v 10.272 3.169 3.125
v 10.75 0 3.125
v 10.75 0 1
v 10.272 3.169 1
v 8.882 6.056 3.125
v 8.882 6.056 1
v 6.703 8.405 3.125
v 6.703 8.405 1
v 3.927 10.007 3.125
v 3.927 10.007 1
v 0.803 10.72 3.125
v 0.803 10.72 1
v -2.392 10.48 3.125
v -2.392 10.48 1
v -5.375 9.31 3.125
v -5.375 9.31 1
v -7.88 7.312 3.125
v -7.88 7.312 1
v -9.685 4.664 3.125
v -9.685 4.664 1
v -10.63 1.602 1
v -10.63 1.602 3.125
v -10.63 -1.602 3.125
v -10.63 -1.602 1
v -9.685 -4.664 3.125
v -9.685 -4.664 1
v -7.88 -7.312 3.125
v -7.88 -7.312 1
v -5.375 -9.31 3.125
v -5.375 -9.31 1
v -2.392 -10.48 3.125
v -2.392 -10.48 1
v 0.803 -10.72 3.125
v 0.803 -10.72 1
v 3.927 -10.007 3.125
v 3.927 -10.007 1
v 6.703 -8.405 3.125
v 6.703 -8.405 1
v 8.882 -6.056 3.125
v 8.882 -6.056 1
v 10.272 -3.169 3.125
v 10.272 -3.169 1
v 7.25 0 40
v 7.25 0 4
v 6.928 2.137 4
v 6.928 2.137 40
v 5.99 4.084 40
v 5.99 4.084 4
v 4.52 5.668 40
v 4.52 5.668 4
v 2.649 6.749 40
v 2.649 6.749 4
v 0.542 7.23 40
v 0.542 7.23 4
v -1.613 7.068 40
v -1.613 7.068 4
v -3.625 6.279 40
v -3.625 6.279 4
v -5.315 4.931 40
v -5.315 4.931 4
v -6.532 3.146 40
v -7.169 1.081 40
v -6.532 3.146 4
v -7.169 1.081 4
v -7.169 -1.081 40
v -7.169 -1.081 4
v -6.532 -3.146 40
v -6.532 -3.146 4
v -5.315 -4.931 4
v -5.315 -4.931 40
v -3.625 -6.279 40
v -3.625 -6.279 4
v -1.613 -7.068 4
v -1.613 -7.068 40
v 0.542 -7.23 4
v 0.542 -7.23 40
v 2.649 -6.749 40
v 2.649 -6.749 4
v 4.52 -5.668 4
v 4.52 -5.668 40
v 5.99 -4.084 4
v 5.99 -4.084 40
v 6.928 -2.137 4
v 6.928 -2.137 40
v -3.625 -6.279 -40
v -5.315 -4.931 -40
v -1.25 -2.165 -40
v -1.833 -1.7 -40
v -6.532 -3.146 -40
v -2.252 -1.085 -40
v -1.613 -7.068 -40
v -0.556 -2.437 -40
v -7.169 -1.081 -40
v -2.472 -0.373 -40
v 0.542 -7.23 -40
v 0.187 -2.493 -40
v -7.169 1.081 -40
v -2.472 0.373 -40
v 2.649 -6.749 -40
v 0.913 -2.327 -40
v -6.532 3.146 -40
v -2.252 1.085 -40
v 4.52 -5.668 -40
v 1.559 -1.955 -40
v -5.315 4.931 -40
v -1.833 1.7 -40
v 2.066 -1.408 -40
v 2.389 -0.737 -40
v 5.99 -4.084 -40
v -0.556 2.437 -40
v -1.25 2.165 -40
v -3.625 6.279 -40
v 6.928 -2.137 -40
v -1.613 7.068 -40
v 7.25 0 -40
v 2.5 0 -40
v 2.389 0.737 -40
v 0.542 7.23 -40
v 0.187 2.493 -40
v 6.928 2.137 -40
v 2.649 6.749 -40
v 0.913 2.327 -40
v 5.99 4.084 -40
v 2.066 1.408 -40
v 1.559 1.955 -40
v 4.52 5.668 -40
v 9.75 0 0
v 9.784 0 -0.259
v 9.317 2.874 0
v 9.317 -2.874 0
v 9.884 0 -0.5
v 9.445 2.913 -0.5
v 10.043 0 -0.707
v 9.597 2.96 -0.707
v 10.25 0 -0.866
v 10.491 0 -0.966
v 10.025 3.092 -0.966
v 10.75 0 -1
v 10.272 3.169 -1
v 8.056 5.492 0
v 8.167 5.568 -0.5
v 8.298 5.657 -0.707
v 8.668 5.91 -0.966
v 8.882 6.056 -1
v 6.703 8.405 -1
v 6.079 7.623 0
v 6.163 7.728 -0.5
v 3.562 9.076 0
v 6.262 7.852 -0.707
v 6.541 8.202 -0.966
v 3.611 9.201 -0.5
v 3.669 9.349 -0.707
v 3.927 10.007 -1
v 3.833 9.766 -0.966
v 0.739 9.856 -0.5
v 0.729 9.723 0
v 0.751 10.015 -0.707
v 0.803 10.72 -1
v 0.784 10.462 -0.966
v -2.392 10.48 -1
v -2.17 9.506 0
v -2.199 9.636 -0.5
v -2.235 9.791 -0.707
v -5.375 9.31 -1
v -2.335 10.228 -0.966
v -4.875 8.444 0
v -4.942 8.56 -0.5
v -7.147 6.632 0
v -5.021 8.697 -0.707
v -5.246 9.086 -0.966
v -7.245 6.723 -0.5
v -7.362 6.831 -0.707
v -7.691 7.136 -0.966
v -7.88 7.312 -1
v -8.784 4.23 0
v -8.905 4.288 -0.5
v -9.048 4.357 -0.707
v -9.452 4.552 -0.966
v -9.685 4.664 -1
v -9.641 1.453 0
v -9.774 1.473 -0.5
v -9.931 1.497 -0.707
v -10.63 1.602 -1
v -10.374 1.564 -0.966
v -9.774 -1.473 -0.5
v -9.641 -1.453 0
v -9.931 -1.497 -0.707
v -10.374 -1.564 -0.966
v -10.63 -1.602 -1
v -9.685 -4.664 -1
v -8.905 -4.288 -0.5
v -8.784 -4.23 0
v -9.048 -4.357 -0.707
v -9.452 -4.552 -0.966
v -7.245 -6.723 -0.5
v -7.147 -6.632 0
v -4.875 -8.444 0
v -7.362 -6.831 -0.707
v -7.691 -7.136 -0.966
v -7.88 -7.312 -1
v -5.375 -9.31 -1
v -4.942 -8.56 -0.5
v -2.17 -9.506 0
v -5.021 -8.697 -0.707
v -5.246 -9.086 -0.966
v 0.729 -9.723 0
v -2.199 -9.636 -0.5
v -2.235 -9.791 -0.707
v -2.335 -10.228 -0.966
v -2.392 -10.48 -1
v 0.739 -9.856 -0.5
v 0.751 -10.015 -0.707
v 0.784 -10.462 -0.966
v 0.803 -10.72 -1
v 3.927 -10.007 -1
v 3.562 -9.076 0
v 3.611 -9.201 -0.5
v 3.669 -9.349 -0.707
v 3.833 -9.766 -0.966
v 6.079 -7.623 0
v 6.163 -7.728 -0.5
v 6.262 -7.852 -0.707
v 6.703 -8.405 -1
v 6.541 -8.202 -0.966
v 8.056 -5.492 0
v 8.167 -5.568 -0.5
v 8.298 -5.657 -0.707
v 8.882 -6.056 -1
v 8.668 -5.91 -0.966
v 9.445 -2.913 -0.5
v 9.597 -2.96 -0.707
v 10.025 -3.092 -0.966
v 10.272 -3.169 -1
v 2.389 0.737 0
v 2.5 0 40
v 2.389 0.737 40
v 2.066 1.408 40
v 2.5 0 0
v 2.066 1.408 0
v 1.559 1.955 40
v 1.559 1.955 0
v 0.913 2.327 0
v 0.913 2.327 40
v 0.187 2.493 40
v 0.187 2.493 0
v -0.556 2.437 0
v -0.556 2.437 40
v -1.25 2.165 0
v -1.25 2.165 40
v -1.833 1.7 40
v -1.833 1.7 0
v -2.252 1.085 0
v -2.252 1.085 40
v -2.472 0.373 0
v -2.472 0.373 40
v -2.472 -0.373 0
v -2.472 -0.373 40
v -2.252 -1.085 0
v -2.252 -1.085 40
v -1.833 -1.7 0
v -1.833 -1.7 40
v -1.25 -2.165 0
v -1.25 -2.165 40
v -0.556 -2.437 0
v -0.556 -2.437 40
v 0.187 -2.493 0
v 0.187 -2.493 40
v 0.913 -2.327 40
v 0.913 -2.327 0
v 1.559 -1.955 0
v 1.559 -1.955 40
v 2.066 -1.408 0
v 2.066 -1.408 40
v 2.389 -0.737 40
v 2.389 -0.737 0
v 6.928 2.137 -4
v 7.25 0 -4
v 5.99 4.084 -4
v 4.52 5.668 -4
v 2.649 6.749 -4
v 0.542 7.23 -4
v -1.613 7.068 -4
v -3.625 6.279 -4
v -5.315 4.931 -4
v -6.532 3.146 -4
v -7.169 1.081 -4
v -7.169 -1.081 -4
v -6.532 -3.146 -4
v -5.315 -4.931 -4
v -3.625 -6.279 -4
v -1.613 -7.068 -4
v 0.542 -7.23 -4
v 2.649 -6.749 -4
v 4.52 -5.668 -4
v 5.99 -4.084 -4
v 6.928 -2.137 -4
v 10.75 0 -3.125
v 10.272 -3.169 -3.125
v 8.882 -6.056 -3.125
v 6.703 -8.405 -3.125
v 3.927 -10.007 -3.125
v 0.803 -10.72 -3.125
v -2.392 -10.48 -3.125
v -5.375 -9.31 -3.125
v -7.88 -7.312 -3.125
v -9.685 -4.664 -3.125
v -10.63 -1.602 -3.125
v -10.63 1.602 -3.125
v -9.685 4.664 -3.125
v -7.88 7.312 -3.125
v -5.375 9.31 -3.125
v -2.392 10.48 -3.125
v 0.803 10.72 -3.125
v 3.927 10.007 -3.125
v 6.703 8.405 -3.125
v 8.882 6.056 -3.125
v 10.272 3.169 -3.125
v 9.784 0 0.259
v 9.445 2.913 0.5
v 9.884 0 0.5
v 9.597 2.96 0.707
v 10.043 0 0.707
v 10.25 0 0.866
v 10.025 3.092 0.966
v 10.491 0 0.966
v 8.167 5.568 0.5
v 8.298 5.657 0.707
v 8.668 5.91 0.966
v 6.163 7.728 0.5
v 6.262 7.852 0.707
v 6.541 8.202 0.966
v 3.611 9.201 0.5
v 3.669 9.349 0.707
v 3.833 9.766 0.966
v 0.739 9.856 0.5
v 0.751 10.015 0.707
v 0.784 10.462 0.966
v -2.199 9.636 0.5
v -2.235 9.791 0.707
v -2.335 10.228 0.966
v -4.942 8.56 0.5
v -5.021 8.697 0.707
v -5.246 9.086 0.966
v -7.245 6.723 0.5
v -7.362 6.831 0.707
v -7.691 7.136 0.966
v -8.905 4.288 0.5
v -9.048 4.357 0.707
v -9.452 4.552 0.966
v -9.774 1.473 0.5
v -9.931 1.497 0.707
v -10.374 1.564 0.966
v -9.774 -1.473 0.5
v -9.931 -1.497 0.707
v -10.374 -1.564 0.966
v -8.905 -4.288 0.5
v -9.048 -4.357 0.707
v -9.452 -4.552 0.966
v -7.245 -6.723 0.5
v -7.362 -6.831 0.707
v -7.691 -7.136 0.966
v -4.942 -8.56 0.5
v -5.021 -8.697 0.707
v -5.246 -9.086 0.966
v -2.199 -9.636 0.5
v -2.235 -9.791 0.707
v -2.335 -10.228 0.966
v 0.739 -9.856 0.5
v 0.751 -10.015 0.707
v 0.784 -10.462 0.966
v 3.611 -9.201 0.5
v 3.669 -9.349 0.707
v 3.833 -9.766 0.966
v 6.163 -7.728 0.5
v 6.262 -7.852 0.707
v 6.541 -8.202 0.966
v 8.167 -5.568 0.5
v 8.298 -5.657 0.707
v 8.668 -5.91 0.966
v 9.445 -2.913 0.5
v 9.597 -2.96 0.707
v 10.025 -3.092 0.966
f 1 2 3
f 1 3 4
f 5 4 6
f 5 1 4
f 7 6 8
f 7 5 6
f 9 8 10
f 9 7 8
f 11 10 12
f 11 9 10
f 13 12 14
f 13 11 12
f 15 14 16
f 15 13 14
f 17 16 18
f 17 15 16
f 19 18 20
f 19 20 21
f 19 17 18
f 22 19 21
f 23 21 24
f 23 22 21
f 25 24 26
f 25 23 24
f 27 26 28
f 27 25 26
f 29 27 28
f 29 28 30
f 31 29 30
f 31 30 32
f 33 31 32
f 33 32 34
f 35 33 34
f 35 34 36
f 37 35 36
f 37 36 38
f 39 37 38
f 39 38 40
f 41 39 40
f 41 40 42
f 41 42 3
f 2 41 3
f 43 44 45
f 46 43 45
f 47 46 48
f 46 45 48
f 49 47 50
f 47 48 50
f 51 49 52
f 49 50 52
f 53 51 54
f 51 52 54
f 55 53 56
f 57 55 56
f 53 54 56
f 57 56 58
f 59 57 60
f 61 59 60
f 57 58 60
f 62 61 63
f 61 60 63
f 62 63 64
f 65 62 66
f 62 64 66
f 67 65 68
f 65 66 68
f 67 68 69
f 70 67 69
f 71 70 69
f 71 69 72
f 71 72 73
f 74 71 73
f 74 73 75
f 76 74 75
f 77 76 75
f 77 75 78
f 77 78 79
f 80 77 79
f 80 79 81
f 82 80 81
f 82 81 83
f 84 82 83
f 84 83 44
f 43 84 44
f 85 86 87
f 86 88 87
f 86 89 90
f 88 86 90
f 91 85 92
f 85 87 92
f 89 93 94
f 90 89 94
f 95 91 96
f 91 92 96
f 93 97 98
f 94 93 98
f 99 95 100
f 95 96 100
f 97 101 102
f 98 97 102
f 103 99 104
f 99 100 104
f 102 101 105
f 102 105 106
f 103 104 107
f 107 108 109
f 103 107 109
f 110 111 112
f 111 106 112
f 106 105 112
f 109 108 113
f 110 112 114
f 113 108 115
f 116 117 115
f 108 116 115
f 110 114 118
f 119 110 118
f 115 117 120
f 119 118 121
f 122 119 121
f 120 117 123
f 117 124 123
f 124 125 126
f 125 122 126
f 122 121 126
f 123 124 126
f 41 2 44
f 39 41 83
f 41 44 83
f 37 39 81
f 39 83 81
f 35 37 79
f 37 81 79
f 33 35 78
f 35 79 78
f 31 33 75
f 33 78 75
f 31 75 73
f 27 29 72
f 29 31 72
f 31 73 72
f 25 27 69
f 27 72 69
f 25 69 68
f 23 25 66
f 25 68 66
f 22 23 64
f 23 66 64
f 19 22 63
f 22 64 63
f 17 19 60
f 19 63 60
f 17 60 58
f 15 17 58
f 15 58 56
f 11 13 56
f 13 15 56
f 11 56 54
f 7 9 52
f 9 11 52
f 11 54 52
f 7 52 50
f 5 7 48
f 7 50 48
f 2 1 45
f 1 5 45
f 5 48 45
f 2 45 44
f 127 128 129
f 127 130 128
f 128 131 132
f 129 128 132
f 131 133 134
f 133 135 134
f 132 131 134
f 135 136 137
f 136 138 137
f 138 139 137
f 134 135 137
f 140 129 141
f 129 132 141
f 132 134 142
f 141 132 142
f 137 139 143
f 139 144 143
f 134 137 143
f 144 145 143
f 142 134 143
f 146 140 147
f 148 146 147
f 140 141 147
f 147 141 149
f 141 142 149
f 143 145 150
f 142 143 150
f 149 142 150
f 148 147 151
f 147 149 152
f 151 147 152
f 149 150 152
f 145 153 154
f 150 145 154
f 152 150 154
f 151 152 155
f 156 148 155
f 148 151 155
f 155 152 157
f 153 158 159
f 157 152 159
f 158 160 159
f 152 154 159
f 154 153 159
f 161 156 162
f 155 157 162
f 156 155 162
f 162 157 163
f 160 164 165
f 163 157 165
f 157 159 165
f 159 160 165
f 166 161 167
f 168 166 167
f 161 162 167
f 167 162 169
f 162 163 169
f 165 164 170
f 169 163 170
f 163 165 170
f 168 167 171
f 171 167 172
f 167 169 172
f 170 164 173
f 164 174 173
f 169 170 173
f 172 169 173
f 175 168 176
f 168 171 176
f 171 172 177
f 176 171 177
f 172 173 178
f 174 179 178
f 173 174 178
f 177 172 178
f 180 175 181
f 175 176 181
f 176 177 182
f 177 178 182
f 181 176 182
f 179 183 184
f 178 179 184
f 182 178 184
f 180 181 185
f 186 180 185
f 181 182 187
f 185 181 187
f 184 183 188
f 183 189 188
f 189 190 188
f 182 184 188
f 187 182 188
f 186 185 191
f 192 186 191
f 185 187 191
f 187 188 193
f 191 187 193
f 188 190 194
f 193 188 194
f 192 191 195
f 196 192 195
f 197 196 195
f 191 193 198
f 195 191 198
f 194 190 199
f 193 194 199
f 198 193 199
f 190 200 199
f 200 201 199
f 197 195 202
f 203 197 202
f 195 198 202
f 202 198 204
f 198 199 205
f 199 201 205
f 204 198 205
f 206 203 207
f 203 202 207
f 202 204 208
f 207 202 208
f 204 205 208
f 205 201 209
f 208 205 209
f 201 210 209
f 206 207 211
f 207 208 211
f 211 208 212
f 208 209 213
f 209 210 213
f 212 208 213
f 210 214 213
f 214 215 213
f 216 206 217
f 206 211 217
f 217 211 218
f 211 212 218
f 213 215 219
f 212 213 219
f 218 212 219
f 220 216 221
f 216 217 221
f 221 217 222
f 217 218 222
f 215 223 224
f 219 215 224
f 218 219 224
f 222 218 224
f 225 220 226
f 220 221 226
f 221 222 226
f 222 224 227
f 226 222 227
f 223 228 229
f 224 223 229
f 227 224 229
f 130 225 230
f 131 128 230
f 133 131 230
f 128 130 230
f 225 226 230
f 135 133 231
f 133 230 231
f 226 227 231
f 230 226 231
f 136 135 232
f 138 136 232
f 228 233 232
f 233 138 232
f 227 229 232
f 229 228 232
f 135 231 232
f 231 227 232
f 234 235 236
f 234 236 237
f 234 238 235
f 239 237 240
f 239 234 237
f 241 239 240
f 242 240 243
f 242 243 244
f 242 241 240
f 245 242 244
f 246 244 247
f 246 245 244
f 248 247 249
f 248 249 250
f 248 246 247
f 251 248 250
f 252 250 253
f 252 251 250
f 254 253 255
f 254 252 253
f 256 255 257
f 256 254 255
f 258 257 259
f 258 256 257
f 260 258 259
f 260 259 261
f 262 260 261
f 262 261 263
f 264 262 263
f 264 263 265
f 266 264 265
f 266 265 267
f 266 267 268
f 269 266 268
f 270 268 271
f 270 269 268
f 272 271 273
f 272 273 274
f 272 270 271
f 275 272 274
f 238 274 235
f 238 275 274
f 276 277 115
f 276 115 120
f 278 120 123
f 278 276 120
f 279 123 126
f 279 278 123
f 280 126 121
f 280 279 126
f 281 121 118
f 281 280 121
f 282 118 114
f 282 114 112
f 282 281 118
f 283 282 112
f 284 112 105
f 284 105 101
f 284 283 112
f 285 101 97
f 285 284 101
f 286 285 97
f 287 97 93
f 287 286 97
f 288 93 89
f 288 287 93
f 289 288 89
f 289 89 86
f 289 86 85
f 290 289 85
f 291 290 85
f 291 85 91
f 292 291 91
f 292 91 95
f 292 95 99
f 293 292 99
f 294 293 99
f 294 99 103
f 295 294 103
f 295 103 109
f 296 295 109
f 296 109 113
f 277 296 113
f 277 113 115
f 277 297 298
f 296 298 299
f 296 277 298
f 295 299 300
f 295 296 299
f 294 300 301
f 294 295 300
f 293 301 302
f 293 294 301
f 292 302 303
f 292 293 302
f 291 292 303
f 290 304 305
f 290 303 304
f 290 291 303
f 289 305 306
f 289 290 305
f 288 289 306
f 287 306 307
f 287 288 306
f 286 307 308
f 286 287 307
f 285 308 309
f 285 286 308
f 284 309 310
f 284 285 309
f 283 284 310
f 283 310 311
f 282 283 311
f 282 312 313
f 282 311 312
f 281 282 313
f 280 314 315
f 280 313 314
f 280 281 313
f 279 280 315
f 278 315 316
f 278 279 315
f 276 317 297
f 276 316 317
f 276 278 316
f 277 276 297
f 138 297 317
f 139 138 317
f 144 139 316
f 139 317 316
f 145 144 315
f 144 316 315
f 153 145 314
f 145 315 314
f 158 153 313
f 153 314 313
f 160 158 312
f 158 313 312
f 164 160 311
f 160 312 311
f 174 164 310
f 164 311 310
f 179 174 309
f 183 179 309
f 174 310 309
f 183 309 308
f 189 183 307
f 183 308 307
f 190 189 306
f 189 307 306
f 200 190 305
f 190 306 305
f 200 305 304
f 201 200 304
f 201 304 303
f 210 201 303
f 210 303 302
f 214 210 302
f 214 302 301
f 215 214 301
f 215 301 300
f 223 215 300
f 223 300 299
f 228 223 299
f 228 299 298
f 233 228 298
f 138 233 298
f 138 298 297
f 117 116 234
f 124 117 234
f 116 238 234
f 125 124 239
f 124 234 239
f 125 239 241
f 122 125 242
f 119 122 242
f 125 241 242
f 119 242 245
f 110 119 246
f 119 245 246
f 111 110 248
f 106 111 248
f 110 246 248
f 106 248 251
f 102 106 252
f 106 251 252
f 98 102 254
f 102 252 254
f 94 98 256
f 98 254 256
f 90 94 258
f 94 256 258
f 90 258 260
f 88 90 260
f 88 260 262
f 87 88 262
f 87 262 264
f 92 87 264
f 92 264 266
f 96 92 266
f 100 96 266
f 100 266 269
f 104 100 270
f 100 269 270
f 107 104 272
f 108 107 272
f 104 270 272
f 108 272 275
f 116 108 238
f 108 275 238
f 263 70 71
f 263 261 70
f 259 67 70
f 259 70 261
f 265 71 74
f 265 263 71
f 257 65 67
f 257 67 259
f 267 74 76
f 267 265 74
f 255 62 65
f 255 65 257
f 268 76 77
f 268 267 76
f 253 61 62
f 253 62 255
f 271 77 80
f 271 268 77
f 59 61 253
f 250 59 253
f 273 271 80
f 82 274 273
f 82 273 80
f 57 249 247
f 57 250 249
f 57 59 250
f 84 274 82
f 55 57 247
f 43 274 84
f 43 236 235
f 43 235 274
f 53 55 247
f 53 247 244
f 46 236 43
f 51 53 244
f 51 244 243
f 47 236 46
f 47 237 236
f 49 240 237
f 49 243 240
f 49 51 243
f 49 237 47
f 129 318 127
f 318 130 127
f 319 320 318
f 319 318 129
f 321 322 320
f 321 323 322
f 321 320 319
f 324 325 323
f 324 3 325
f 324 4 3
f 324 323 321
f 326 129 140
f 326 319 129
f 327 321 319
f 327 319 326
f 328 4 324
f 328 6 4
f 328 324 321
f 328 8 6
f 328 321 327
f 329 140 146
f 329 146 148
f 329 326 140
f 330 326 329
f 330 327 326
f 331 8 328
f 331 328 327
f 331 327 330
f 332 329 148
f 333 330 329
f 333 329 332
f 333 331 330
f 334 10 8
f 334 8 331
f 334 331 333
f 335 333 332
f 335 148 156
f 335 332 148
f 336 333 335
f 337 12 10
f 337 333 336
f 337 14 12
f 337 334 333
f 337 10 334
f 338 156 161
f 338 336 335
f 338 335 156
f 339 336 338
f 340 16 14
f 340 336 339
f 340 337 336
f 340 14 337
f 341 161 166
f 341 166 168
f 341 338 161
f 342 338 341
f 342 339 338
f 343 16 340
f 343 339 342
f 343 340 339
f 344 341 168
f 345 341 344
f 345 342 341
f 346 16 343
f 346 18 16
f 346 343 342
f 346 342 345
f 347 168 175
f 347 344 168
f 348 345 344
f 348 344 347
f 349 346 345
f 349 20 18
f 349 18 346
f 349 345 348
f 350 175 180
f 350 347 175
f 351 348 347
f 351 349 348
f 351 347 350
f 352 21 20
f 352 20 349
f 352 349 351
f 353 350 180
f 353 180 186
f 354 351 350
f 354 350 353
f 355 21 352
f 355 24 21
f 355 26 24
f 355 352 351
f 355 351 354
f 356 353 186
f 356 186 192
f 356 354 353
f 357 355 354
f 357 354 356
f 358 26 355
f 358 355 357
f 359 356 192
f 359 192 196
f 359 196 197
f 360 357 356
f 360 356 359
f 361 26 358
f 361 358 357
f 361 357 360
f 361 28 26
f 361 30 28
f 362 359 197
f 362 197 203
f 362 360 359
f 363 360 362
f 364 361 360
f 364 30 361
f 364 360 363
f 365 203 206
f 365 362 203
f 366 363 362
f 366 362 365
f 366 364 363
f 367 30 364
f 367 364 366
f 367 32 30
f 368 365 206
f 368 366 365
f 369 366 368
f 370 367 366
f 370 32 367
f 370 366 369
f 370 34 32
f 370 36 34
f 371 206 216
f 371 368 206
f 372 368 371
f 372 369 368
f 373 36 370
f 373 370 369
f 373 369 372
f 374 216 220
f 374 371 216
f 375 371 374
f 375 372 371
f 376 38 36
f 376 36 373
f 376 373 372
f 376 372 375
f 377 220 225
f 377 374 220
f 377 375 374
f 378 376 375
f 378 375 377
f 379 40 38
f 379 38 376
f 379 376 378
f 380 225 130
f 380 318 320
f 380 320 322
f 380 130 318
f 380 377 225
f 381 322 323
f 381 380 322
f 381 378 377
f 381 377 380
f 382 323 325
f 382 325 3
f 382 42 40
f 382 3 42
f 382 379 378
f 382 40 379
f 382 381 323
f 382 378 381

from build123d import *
from build123d import SkipClean  # not in build123d's __all__

# Parameters (mm, degrees)
F0_R        = 7.25
F0_R_2      = 2.5
F1_DEPTH    = 40
F4_S5_R     = 10.75
F4_T6_DEPTH = 17


# Not quite as in the source:
# - a fillet or chamfer that OpenCascade refuses, or shapes differently, is made with other operations: its cross-section is extruded or revolved along the edge and cut away or added


with BuildPart() as f1:
    # F0 (on Top) → F1 (new body)
    with BuildSketch(Plane.XY):
        Circle(F0_R)
        Circle(F0_R_2, mode=Mode.SUBTRACT)
    extrude(amount=F1_DEPTH)

    # F2 (on Front) → F3 (revolve)
    with BuildSketch(Plane.XZ):
        with BuildLine():
            Line((10.75, 3), (2.5, 3))
            Line((2.5, 3), (2.5, 0))
            Line((2.5, 0), (9.75, 0))
            ThreePointArc((9.75, 0), (10.0428932188, 0.7071067812), (10.75, 1))
            Line((10.75, 1), (10.75, 3))
        make_face()
    revolve(axis=Axis((0, 0, 1.5), (0, 0, 1)))

    # F4: chamfer of 4 x 1 on 1 edges, made by hand


with BuildPart() as f4_tool2:
    # F4_s3 → F4_t4 (revolve)
    with BuildSketch(Plane.XZ):
        Polygon((11.25, 3), (7.25, 4), (7.25, 3), align=None)
    revolve(axis=Axis((0, 0, 3), (0, 0, -1)))

    # F4_s5 → F4_t6 (intersect, symmetric)
    with BuildSketch(Plane.XY.offset(3.5)):
        Circle(F4_S5_R)
    extrude(amount=F4_T6_DEPTH, both=True, mode=Mode.INTERSECT)


with BuildPart() as f1_1:
    add(f1.part, clean=False)

    # F4_t1: union F4_tool2
    add(f4_tool2.part)

    # F5: F1 across face


with BuildPart() as f1_2:
    add(f1_1.part, clean=False)
    with SkipClean():  # cleaning this boolean's faces spoils the solid; the shape is the same uncleaned
        add(f1_1.part.mirror(Plane(origin=(0, 0, 0), x_dir=(1, 0, 0), z_dir=(0, 0, -1))), clean=False)


solid = f1_2.part
